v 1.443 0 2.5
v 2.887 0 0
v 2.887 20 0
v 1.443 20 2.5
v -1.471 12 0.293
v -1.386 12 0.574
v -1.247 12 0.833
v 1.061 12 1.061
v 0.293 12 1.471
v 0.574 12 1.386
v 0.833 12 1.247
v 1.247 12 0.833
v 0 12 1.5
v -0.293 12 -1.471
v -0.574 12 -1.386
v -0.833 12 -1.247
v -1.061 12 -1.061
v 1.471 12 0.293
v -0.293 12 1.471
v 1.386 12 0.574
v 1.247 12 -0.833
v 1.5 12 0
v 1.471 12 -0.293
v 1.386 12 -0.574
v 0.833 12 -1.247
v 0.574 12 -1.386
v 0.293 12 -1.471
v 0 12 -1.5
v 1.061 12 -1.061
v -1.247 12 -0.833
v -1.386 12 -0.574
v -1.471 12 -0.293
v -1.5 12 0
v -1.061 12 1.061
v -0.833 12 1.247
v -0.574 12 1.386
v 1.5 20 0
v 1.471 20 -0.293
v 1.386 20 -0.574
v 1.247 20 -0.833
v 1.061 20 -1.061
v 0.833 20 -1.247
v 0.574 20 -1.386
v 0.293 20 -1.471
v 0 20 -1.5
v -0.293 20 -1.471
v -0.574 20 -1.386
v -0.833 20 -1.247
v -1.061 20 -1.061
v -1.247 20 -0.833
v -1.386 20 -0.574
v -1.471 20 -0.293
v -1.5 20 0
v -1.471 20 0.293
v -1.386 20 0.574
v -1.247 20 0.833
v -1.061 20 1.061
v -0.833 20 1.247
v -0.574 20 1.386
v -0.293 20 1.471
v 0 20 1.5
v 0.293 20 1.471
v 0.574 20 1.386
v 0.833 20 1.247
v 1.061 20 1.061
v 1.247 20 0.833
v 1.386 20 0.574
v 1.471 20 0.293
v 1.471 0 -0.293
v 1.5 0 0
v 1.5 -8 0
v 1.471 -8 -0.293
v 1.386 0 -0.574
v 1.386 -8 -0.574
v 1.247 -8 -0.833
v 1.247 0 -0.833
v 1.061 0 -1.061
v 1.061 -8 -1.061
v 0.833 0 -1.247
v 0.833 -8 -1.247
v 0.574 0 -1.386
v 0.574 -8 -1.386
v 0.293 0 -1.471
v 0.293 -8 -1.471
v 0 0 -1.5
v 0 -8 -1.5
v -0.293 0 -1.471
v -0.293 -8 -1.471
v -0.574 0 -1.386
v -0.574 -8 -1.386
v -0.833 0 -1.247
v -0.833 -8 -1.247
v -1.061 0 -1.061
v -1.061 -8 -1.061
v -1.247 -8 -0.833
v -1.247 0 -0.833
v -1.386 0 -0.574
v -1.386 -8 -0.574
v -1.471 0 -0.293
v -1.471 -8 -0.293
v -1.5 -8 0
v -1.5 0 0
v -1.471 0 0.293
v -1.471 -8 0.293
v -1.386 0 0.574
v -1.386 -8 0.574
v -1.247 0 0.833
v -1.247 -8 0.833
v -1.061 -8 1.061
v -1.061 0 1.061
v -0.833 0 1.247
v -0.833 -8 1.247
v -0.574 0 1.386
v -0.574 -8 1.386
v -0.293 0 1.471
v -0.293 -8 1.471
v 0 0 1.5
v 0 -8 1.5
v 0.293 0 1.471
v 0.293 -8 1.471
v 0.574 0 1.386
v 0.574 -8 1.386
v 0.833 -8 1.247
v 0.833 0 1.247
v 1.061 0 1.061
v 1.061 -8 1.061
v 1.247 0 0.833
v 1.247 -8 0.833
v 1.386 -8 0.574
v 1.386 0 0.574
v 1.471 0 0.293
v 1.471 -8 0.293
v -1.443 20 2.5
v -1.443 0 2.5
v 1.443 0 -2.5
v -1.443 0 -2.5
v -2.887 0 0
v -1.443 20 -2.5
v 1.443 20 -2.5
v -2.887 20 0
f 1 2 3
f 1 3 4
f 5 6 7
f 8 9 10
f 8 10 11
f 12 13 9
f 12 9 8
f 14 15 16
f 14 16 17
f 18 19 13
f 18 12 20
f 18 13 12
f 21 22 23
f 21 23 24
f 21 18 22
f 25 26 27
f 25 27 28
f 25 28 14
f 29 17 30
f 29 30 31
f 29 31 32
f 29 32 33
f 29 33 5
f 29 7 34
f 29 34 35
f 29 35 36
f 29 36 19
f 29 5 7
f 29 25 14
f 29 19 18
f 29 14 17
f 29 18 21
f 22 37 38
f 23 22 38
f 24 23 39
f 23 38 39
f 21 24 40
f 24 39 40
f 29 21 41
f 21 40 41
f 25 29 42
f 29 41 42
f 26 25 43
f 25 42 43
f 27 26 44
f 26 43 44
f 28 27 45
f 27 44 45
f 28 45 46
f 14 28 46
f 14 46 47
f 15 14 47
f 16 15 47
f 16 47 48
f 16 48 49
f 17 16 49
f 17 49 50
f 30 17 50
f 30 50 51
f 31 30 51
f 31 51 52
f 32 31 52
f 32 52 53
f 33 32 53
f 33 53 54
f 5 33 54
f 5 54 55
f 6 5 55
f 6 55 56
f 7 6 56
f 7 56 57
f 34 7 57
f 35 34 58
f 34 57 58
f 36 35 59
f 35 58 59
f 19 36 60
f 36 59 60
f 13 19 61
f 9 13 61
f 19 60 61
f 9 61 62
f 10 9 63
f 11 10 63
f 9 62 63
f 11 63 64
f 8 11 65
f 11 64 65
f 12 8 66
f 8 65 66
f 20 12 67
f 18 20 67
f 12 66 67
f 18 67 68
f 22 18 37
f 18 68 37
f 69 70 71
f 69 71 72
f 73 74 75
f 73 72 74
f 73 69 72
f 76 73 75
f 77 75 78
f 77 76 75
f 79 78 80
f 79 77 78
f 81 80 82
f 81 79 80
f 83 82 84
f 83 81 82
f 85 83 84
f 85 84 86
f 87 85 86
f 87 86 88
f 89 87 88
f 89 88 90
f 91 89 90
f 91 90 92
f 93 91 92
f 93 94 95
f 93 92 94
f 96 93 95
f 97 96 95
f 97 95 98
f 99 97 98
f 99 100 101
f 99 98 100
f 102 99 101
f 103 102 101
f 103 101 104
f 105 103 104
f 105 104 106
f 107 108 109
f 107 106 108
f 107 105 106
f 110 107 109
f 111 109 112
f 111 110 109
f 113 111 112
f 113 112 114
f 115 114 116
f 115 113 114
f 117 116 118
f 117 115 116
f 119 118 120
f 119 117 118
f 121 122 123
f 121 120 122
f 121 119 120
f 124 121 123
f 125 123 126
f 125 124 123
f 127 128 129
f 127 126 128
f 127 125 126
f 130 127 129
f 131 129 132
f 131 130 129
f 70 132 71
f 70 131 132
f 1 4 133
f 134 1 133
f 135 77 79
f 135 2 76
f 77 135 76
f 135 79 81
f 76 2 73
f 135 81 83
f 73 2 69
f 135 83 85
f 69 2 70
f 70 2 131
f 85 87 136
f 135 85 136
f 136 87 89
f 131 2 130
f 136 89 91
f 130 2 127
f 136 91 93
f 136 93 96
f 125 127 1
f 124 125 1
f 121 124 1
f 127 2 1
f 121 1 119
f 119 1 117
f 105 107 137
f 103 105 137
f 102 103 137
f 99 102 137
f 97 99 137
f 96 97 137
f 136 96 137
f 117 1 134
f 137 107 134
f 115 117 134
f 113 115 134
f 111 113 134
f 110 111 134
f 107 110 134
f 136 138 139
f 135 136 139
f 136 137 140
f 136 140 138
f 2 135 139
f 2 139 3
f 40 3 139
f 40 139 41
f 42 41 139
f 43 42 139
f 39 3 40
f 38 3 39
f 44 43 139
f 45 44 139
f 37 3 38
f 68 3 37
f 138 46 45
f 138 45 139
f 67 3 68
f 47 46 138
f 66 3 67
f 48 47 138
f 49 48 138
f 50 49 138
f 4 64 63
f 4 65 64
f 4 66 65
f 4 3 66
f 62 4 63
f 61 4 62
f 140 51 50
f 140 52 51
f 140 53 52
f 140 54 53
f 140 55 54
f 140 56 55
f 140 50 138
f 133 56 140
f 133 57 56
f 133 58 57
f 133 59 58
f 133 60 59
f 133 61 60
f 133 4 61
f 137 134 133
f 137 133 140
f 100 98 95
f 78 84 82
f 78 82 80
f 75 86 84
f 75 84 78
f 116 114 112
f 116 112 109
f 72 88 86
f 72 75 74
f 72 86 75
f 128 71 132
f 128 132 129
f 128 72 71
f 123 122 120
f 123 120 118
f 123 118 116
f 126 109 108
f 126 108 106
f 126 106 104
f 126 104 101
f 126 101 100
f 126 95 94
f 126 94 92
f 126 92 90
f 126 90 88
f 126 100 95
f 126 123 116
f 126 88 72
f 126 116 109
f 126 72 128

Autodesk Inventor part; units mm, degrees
ref_plane "YZ Plane" through (0, 0, 0) normal (1, 0, 0) x (0, 1, 0)
ref_plane "XZ Plane" through (0, 0, 0) normal (0, 1, 0) x (-1, 0, 0)
ref_plane "XY Plane" through (0, 0, 0) normal (0, 0, 1) x (1, 0, 0)
sketch "Náčrt1" plane through (0, 0, 0) normal (0, 1, 0) x (-1, 0, 0)
  line L0 (-2.8868, 0) -> (-1.4434, 2.5)
  line L1 (-1.4434, 2.5) -> (1.4434, 2.5)
  line L2 (1.4434, 2.5) -> (2.8868, 0)
  line L3 (2.8868, 0) -> (1.4434, -2.5)
  line L4 (1.4434, -2.5) -> (-1.4434, -2.5)
  line L5 (-1.4434, -2.5) -> (-2.8868, 0)
  point P0 (0, 0)
  point P1 (0, 0)
  dimension "d0" = 5
extrude "Vysunutí1" add sketch "Náčrt1" along normal blind 20
sketch "Náčrt2" plane through (0, 20, 0) normal (0, 1, 0) x (1, 0, 0)
  circle A0 centre (0, 0) radius 1.5
  dimension "d3" = 3
extrude "Vysunutí2" cut sketch "Náčrt2" against normal blind 8
thread "Závit1" size "M3x0.5" class "6H" standard "ANSI Metric M Profile" full length
sketch "Náčrt3" plane through (0, 0, 0) normal (0, -1, 0) x (1, 0, 0)
  circle A0 centre (0, 0) radius 1.5 projected
extrude "Vysunutí3" add sketch "Náčrt3" along normal blind 8
thread "Závit2" size "M3x0.5" class "6g" standard "ANSI Metric M Profile" full length
properties part number "m3x20mm distanční sloupek"
